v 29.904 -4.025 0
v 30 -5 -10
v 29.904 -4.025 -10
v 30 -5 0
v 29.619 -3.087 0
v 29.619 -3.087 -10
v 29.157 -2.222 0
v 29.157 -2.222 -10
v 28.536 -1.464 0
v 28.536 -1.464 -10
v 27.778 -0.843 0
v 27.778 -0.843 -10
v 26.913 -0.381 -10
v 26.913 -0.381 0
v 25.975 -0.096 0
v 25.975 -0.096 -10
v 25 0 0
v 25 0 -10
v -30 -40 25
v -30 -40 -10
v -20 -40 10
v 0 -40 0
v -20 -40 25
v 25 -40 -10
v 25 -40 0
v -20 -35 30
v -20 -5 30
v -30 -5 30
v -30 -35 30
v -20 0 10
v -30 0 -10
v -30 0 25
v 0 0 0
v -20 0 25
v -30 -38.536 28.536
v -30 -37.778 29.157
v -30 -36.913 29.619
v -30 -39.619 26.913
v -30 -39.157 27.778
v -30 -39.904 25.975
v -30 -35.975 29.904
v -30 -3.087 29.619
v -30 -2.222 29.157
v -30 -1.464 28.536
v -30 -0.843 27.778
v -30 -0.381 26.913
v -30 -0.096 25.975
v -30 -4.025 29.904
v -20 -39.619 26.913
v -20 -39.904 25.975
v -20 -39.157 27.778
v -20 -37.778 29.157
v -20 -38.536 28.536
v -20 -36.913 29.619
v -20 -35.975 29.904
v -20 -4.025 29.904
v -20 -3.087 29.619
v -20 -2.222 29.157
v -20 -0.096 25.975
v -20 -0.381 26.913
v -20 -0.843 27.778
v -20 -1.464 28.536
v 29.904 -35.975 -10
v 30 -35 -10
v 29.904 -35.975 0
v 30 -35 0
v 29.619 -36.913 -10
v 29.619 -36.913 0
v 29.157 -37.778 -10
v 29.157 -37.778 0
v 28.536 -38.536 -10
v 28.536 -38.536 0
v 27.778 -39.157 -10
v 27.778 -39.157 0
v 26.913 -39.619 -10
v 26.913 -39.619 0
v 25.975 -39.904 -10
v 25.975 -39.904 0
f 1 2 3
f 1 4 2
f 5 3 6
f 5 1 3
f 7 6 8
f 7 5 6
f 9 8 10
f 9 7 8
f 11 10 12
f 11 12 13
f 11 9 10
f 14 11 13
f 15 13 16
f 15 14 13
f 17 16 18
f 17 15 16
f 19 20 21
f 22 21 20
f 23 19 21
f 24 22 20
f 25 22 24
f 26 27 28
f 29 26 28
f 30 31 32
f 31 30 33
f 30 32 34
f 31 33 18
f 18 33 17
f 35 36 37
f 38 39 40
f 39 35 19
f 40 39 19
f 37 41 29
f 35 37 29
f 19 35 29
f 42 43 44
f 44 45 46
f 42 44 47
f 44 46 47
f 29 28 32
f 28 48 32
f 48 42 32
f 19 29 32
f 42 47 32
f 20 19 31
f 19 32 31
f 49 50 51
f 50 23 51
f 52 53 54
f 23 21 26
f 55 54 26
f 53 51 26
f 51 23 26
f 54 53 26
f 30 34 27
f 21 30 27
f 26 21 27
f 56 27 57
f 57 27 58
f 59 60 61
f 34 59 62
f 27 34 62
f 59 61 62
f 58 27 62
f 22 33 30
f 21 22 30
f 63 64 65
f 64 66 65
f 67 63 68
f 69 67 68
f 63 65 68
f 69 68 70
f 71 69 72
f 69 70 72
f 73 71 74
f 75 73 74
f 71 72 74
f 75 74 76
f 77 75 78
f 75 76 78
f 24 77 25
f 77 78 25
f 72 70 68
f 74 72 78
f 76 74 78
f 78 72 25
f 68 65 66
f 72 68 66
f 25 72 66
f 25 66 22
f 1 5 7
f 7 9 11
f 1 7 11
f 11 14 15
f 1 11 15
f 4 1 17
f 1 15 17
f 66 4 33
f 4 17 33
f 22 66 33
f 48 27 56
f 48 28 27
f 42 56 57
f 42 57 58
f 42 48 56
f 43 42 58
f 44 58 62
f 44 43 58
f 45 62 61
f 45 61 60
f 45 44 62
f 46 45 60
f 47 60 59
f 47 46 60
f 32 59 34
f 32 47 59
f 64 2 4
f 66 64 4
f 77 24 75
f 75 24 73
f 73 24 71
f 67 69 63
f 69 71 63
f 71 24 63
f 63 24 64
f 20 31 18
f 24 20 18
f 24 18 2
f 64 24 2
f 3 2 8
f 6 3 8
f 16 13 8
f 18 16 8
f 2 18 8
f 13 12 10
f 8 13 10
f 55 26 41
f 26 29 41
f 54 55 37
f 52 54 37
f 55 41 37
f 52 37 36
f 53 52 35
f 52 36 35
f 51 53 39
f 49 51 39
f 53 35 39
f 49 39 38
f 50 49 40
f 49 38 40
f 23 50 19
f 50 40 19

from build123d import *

# Parameters (mm, degrees)
F1_DEPTH = 40
F2_R     = 5


with BuildPart() as f1:
    # F0 (on Front) → F1 (new body)
    with BuildSketch(Plane.XZ):
        Polygon((30, 0), (0, 0), (-20, 10), (-20, 30), (-30, 30), (-30, -10), (30, -10), align=None)
    extrude(amount=F1_DEPTH)

    # F2
    f2_edges = [f1.edges().sort_by_distance(p)[0] for p in [
        (30, -40, -5),
        (30, 0, -5),
        (-25, -40, 30),
        (-25, 0, 30),
    ]]
    fillet(f2_edges, radius=F2_R)


solid = f1.part
